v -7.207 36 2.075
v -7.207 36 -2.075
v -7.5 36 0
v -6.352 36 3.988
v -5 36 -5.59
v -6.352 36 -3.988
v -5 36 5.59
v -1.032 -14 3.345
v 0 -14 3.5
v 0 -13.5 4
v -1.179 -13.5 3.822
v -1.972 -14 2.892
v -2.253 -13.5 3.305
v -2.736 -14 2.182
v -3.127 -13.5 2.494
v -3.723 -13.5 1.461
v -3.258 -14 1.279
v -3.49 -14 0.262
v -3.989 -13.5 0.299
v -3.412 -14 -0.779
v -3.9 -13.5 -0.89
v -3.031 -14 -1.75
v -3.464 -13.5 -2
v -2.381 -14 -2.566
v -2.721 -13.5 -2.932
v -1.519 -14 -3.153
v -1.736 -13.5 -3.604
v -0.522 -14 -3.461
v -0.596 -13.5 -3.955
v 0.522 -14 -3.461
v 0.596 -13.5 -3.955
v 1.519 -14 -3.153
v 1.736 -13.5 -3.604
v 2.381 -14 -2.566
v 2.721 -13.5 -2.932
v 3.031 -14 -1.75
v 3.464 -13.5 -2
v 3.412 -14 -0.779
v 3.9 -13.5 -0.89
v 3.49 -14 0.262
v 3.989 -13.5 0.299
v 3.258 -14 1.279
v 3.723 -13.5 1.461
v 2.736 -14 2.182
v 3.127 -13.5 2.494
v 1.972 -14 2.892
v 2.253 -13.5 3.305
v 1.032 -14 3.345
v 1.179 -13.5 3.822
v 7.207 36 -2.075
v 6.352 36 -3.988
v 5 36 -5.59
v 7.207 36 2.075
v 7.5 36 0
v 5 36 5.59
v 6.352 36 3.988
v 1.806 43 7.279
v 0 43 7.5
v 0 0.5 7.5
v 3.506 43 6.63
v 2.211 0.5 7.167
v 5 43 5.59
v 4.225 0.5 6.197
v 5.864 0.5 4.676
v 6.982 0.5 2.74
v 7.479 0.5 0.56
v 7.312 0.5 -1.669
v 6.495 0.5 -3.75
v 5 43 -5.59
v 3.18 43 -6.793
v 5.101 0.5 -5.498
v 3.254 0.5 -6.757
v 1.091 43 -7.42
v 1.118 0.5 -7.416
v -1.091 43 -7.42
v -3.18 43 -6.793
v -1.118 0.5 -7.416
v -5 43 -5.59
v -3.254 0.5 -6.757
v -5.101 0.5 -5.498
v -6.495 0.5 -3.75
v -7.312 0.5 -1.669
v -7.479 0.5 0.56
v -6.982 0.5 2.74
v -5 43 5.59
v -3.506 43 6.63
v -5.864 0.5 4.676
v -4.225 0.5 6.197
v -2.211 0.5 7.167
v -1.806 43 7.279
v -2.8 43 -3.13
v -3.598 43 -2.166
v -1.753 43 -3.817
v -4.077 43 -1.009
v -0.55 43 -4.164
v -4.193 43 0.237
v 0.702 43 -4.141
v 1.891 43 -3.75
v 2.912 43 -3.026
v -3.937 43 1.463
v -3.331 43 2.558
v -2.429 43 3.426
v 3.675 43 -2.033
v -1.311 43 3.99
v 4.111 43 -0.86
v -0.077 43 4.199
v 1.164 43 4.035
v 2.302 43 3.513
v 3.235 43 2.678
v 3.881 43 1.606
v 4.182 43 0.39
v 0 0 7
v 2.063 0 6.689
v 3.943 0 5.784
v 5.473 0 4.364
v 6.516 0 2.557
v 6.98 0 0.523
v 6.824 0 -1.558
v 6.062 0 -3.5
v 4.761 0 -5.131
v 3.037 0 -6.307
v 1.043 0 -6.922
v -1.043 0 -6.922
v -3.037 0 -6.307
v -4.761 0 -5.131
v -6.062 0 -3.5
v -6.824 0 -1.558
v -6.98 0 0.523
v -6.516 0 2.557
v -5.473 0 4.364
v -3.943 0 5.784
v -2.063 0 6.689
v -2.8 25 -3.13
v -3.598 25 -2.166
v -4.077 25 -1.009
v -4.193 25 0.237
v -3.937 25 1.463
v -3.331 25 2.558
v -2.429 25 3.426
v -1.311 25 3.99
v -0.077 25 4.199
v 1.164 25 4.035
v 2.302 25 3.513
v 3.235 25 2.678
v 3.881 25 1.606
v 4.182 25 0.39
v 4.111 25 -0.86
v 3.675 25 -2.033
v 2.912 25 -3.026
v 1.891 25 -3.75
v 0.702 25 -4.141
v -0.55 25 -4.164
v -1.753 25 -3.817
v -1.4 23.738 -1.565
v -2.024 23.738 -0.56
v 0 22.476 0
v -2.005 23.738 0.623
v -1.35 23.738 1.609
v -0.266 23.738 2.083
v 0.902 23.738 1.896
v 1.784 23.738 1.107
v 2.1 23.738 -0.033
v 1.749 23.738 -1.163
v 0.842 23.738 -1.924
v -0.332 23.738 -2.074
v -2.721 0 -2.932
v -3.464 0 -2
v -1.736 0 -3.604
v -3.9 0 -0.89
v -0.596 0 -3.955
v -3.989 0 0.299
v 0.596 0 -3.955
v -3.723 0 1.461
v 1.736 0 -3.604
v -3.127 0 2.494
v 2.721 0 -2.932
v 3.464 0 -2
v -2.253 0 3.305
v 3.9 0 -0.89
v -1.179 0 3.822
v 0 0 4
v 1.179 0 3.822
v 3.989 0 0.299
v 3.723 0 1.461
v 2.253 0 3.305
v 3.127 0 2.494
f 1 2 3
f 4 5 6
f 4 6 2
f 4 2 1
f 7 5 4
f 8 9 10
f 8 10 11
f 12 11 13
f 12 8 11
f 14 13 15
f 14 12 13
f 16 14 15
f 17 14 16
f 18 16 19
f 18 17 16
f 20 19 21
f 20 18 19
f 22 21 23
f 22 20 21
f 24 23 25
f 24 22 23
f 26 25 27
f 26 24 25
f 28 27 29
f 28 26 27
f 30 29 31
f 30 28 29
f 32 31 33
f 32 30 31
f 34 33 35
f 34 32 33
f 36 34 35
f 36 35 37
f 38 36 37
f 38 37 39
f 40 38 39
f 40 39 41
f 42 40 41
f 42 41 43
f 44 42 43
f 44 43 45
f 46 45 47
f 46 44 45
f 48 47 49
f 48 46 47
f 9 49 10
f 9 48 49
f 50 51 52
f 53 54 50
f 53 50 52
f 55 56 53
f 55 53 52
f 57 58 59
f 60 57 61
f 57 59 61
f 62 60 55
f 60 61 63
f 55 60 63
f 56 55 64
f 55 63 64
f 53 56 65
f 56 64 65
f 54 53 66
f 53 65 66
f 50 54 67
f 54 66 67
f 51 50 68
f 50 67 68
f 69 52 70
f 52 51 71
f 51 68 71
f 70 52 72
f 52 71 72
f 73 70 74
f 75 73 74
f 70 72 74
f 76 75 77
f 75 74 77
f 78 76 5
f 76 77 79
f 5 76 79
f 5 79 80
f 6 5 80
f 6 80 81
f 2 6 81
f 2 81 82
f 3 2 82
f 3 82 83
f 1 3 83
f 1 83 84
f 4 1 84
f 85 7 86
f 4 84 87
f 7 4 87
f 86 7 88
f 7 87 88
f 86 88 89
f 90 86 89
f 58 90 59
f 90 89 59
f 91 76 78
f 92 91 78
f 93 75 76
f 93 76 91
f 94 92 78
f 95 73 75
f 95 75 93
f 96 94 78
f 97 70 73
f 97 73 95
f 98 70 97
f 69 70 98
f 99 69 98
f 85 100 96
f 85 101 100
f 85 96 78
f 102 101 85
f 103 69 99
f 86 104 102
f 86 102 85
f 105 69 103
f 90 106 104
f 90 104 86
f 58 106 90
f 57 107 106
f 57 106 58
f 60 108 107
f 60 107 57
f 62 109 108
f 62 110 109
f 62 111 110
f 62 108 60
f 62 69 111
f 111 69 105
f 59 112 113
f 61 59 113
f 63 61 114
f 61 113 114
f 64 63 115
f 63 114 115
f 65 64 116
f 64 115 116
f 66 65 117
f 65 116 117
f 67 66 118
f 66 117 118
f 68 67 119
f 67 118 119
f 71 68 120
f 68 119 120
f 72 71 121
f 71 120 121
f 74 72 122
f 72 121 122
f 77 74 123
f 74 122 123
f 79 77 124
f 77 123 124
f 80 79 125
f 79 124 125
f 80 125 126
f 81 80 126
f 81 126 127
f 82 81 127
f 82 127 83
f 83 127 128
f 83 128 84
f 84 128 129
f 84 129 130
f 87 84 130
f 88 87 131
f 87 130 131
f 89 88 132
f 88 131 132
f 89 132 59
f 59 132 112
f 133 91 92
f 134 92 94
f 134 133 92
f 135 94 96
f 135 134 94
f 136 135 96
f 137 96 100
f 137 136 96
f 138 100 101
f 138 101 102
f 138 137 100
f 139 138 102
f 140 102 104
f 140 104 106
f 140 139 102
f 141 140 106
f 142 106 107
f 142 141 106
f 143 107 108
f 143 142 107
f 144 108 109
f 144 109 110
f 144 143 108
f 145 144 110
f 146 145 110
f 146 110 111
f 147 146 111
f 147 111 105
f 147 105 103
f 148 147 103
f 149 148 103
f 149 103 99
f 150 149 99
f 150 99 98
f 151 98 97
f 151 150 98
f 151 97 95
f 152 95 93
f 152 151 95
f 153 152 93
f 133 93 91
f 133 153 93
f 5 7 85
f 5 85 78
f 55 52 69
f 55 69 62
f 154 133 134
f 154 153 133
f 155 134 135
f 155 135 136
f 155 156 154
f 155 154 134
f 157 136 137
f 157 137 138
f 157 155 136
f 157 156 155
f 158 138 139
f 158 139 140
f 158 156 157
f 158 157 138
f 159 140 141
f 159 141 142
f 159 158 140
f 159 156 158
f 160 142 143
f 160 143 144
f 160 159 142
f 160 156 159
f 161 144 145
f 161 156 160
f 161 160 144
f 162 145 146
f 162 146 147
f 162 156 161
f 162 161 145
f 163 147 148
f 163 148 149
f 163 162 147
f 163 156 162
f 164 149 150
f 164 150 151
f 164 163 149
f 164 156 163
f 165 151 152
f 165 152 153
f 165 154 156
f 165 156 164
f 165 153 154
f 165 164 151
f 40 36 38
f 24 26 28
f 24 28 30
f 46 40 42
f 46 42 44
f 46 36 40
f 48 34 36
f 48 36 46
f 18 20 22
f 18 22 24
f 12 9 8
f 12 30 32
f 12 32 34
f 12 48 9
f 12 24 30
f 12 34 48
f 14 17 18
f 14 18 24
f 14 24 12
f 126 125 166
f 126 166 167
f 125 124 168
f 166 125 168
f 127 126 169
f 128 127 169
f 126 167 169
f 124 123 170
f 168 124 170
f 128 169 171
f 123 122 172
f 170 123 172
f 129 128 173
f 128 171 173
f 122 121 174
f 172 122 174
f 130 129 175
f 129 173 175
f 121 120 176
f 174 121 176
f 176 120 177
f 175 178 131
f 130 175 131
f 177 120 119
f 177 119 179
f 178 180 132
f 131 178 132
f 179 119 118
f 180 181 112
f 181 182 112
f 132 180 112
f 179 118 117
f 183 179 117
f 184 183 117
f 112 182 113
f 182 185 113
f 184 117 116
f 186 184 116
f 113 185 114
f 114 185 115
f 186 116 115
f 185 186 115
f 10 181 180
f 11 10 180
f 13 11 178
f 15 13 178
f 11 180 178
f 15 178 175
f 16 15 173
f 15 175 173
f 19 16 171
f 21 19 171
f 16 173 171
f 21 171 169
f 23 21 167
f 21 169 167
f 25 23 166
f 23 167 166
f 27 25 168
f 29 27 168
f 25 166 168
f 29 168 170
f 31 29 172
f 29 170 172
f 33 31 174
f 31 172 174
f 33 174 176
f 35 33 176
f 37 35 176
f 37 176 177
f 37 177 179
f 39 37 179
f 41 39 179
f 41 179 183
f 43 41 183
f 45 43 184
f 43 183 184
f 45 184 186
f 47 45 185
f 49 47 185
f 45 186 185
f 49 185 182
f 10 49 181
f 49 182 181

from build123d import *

# Parameters (mm, degrees)
SKETCH1_R          = 7.5
EXTRUDE1_DEPTH     = 43
SKETCH2_R          = 4
EXTRUDE2_DEPTH     = 14
CUT_EXTRUDE1_START = -7
CUT_EXTRUDE1_DEPTH = 7
CHAMFER1_SIZE      = 0.5


with BuildPart() as part:
    # Sketch1 → Extrude1 (new body)
    with BuildSketch(Plane(origin=(0, 0, 0), x_dir=(1, 0, 0), z_dir=(0, 1, 0))):
        with Locations(Location((0, 0, 0), (0, 0, 270))):
            Circle(SKETCH1_R)
    extrude(amount=EXTRUDE1_DEPTH)

    # Sketch2 → Extrude2 (add)
    with BuildSketch(Plane.XZ):
        with Locations(Location((0, 0, 0), (0, 0, 90))):
            Circle(SKETCH2_R)
    extrude(amount=EXTRUDE2_DEPTH)

    # Sketch4 → Cut-Extrude1 (cut)
    with BuildSketch(Plane(origin=(0, 43, 0), x_dir=(-1, 0, 0), z_dir=(0, 1, 0)).offset(CUT_EXTRUDE1_START)):
        with BuildLine():
            Line((-5, -5.590169944), (-5, 5.590169944))
            ThreePointArc((-5, 5.590169944), (-7.5, 0), (-5, -5.590169944))
        make_face()
        with BuildLine():
            ThreePointArc((7.5, 0), (6.846531969, 3.061862178), (5, 5.590169944))
            Line((5, 5.590169944), (5, -5.590169944))
            ThreePointArc((5, -5.590169944), (6.846531969, -3.061862178), (7.5, 0))
        make_face()
    extrude(amount=CUT_EXTRUDE1_DEPTH, mode=Mode.SUBTRACT)

    # Chamfer1
    chamfer1_edges = [part.edges().sort_by_distance(p)[0] for p in [
        (0, 0, -7.5),
        (0, -14, -4),
    ]]
    chamfer(chamfer1_edges, length=CHAMFER1_SIZE)

    # Sketch5 → Cut-Revolve2 (revolve, cut)
    with BuildSketch(Plane.XY, mode=Mode.PRIVATE) as cut_revolve2_sk:
        Polygon((0, 43), (4.2, 43), (4.2, 25), (0, 22.4763854), align=None)
    revolve(cut_revolve2_sk.sketch.rotate(Axis((0, 0, 0), (0, 1, 0)), 131.810314896), axis=Axis((0, 0, 0), (0, 1, 0)), mode=Mode.SUBTRACT)


solid = part.part
